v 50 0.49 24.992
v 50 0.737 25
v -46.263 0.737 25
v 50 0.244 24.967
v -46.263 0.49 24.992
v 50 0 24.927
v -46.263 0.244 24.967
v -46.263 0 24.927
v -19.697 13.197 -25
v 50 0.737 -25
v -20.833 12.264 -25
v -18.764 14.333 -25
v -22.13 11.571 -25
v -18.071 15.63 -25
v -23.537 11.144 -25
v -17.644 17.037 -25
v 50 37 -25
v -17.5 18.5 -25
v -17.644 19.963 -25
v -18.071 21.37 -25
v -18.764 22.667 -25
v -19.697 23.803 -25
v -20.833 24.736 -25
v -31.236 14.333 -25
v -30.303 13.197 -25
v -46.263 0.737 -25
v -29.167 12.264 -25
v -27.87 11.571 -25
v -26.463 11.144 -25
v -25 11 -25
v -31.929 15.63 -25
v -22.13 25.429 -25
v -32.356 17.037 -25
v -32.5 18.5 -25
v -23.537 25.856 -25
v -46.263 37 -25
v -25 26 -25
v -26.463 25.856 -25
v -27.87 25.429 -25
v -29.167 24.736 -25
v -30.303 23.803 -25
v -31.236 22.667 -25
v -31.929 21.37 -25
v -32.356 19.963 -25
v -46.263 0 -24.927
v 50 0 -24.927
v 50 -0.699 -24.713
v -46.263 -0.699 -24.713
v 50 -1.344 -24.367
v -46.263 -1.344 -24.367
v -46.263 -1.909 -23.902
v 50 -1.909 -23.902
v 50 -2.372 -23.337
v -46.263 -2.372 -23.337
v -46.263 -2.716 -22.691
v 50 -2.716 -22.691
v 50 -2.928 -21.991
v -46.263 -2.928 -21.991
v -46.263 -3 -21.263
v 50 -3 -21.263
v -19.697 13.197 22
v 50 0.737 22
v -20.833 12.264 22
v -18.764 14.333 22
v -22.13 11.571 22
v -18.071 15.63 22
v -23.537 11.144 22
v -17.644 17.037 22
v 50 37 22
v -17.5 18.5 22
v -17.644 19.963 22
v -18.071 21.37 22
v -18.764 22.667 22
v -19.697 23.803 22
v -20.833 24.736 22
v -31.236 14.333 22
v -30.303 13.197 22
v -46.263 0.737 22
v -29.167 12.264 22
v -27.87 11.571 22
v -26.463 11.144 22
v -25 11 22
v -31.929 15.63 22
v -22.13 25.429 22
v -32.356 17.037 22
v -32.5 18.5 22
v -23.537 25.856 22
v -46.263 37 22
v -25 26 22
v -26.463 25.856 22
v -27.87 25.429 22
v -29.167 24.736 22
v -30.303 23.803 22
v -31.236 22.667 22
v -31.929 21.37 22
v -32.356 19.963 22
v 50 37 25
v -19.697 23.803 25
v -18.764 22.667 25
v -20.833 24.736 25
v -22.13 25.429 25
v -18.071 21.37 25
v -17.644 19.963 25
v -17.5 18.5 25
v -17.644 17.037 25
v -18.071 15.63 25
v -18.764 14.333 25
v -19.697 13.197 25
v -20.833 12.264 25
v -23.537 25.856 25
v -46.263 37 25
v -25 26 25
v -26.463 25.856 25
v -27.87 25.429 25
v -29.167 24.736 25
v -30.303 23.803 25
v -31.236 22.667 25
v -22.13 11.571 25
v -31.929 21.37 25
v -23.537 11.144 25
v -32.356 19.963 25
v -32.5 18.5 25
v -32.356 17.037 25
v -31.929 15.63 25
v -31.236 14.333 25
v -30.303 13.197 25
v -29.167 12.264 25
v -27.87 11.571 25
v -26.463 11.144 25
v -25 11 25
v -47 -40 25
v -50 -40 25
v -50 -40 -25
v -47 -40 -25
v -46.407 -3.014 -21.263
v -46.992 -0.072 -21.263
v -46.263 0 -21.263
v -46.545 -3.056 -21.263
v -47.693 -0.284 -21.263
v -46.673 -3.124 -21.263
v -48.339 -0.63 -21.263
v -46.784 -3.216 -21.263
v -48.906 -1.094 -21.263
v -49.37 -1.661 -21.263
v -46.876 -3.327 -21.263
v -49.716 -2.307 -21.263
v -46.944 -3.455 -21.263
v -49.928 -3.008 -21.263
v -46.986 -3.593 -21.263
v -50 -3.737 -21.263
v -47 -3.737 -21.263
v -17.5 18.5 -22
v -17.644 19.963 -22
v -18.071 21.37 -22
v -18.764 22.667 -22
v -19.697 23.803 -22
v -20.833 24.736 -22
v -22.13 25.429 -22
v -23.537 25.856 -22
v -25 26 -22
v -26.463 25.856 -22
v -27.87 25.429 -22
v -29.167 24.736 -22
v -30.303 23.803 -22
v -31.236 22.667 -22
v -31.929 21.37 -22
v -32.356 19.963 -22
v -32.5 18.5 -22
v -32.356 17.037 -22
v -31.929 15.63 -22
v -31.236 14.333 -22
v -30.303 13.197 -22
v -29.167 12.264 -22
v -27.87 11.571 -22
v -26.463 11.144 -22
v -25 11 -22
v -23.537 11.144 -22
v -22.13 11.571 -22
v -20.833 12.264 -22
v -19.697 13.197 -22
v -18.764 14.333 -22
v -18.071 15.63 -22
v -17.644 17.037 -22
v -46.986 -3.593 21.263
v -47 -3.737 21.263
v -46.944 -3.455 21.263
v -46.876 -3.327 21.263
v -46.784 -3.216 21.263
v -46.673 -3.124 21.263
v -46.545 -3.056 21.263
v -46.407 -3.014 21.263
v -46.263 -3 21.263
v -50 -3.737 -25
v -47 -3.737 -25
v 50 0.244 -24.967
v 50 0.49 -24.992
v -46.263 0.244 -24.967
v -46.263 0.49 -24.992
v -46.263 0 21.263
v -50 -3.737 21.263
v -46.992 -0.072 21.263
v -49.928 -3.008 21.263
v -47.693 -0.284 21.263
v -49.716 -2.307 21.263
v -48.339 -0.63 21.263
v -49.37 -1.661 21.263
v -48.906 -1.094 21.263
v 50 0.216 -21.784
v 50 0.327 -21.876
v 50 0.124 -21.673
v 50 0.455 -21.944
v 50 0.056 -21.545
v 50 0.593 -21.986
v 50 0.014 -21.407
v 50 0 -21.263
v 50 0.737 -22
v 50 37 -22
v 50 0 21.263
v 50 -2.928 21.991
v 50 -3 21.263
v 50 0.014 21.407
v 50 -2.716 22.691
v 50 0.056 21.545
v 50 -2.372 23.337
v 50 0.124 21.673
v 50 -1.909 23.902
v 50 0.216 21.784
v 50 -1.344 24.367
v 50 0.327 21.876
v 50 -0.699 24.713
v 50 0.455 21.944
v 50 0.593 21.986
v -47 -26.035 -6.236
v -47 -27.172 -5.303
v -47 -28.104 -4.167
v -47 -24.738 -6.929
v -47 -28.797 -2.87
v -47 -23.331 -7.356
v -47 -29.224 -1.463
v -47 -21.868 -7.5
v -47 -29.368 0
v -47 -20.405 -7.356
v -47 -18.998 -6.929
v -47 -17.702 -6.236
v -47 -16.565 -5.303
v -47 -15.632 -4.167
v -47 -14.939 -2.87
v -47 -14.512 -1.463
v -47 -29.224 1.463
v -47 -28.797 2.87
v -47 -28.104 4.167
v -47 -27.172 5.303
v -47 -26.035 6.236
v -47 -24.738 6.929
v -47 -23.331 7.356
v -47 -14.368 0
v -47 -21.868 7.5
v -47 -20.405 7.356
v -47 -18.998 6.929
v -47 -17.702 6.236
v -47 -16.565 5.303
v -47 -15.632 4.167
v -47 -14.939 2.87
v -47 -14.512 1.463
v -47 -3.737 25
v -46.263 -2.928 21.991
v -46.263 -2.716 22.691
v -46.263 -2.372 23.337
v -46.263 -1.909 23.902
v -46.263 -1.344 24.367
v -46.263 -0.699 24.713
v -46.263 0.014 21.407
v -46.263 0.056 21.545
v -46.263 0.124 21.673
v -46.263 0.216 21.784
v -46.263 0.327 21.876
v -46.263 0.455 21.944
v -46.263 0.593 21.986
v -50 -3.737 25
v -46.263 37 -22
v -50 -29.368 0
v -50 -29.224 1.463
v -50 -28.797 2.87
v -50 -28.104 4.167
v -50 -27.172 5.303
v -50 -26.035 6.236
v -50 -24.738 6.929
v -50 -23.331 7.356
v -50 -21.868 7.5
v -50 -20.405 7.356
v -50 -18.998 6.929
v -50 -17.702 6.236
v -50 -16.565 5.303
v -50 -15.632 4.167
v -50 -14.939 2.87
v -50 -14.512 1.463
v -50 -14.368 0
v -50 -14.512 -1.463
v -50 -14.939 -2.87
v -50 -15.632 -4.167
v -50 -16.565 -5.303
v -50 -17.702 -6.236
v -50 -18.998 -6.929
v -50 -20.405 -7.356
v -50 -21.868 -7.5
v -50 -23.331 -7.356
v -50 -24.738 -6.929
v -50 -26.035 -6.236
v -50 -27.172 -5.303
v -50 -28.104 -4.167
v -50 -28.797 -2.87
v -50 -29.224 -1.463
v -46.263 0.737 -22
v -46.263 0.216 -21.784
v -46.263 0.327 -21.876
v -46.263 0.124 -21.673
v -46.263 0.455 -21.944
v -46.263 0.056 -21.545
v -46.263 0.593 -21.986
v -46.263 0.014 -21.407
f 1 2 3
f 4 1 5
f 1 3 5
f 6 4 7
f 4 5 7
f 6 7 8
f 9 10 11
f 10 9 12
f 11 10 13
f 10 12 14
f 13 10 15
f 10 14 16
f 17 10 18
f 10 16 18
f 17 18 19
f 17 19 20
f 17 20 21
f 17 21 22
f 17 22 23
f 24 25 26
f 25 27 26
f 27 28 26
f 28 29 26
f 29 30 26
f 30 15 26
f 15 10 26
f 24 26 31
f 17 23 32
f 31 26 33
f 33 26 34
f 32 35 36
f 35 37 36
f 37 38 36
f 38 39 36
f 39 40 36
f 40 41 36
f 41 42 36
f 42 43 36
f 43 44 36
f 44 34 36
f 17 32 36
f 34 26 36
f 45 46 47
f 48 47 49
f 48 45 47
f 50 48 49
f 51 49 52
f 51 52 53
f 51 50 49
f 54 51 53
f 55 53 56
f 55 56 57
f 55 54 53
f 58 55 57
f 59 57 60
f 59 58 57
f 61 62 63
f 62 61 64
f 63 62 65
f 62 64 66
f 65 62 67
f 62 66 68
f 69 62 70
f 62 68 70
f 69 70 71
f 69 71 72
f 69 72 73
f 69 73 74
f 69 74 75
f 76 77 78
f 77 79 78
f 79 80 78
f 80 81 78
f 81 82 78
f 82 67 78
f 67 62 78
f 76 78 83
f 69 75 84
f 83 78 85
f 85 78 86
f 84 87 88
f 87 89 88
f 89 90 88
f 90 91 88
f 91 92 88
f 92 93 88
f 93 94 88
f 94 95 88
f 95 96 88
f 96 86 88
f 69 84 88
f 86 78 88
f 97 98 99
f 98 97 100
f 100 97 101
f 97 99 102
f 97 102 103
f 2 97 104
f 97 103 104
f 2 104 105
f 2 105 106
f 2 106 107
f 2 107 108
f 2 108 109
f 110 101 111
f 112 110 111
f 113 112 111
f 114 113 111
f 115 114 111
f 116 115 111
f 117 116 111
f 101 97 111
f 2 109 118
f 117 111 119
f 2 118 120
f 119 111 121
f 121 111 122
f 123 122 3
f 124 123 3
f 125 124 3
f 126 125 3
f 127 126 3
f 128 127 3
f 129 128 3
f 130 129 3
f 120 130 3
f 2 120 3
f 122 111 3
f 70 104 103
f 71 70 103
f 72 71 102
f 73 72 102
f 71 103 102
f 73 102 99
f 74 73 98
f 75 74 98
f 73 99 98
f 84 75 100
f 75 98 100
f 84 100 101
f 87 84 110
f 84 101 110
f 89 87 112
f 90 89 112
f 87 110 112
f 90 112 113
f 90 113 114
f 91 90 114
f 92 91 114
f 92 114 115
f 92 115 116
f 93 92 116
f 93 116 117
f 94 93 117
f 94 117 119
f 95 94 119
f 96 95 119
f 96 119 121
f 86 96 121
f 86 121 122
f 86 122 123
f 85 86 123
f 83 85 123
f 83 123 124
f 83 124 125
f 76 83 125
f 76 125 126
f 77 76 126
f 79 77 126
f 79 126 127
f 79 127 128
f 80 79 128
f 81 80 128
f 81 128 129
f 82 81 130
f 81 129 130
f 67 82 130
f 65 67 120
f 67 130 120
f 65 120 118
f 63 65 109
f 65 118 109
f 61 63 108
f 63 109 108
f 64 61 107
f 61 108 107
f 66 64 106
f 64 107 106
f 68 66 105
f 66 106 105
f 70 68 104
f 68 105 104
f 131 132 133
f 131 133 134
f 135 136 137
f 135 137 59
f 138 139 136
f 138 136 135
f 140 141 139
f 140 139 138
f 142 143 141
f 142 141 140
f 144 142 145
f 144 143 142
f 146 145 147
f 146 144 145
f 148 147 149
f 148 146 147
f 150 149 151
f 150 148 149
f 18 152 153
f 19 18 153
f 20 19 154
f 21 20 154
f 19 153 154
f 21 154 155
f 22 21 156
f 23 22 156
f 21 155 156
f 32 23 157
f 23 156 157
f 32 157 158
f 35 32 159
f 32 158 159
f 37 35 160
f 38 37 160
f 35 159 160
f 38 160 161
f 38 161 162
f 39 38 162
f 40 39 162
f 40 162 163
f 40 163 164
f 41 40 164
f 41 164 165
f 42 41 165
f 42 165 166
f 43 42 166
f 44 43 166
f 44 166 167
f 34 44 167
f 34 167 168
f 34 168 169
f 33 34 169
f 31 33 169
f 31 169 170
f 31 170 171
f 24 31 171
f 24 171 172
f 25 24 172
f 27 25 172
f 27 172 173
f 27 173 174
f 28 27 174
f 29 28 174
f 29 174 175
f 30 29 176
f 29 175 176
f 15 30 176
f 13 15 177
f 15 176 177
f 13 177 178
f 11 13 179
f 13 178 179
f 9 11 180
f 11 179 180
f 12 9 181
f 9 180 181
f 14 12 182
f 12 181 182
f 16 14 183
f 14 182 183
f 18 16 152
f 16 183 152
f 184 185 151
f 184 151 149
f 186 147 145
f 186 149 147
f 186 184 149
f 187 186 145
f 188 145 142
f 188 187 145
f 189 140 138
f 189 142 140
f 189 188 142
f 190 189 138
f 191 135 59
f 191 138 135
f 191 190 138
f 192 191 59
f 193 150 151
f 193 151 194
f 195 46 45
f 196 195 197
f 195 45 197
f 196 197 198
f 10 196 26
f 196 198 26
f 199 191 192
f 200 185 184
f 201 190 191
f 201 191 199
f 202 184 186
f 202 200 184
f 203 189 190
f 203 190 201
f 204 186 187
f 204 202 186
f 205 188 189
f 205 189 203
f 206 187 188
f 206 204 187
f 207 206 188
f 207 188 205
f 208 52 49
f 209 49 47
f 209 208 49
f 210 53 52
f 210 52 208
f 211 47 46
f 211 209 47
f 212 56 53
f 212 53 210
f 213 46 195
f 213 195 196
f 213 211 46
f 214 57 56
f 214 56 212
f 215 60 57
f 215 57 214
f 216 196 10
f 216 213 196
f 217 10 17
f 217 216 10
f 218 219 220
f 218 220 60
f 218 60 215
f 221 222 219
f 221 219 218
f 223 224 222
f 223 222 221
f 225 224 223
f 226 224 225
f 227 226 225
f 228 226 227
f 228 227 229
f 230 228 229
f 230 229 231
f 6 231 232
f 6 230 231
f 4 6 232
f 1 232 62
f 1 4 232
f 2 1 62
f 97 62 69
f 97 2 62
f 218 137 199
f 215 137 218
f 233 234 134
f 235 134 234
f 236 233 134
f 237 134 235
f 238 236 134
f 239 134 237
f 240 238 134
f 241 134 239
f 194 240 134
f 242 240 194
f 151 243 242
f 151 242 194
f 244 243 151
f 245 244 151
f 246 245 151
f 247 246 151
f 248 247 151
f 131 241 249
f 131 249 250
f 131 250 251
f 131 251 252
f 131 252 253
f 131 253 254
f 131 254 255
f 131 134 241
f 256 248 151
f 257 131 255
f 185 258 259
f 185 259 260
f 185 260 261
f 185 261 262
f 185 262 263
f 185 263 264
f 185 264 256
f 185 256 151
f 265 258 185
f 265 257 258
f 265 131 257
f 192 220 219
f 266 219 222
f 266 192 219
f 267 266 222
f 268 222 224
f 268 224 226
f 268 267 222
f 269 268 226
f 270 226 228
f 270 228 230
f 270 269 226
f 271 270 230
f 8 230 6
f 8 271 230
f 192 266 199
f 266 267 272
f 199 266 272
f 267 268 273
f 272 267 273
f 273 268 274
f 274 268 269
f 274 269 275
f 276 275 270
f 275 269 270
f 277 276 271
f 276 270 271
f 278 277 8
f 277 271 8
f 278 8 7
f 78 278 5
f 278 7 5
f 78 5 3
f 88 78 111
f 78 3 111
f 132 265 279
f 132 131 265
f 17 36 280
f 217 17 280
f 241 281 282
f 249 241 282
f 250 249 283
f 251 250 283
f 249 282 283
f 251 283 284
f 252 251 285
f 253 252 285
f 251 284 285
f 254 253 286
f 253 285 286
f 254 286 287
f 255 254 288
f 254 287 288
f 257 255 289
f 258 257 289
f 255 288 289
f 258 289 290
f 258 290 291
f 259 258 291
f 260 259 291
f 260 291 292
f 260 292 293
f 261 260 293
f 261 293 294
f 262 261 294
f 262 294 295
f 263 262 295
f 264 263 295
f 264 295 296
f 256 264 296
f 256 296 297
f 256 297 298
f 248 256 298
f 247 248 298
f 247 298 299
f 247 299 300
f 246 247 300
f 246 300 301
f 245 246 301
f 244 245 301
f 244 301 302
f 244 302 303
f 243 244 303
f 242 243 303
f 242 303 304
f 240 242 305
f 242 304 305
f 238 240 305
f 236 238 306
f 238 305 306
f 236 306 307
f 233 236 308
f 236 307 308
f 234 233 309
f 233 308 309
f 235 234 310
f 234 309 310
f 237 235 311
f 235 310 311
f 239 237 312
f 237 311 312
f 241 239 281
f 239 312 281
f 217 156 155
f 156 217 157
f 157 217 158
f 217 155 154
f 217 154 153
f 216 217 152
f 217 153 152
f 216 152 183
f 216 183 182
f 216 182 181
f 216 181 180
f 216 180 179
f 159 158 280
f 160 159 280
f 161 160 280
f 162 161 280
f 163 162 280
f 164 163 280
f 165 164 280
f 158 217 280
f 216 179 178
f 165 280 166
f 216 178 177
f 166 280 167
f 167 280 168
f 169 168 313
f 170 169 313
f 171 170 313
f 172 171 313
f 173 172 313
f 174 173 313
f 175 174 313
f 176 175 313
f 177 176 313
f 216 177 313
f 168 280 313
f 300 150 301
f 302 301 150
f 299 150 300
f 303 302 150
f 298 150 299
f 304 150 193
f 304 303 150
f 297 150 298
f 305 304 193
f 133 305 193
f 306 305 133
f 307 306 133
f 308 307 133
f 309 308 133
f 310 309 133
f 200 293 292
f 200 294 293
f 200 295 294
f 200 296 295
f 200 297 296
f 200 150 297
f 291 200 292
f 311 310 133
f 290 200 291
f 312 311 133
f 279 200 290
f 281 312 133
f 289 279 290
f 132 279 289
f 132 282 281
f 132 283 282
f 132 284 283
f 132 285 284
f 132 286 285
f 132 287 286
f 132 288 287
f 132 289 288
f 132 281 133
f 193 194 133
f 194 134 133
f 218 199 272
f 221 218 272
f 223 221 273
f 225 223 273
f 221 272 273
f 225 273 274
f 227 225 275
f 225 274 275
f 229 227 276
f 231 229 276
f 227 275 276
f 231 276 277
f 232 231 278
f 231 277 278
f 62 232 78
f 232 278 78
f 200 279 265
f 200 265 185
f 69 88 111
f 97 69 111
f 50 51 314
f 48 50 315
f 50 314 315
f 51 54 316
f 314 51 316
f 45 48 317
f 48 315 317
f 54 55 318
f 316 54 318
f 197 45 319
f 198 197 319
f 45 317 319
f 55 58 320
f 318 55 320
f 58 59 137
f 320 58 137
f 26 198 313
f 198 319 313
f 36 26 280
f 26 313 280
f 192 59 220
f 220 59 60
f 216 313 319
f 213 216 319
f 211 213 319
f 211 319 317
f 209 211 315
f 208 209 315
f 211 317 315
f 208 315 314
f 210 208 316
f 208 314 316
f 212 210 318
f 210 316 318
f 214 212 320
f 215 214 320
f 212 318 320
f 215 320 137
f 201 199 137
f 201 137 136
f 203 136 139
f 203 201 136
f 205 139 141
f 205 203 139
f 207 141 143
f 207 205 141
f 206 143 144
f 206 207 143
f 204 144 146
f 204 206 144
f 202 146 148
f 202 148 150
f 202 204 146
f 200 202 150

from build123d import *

# Parameters (mm, degrees)
SKETCH1_W                    = 100
SKETCH1_H                    = 50
BASE_FLANGE1_DEPTH           = 3
EDGE_FLANGE1_STRIP_W         = 13.4732
EDGE_FLANGE1_STRIP_H         = 3
EDGE_FLANGE1_STRIP_CUT_DEPTH = 50
EDGE_FLANGE1_DEPTH           = 50
EDGE_FLANGE2_START           = -50
EDGE_FLANGE2_DEPTH           = 100
EDGE_FLANGE2_2_DEPTH         = 3.7366
EDGE_FLANGE2_START_2         = -46.2634
EDGE_FLANGE2_3_DEPTH         = 96.2634
SKETCH15_R                   = 7.5
CUT_EXTRUDE1_DEPTH           = 82.240384046
CUT_EXTRUDE2_REACH           = 112.567
SKETCH16_R                   = 7.5


# Read off the part's stored shape, not the designer's step: Edge-Flange2
# Sheet-metal steps are written as plain solids
with BuildPart() as part:
    # Sketch1 → Base-Flange1 (new body)
    with BuildSketch(Plane(origin=(0, 0, 0), x_dir=(1, 0, 0), z_dir=(0, 1, 0))):
        Rectangle(SKETCH1_W, SKETCH1_H)
    extrude(amount=-BASE_FLANGE1_DEPTH)

    # Edge-Flange1 strip (across the edge) → Edge-Flange1 strip cut (cut)
    with BuildSketch(Plane(origin=(-50, -3, 25), x_dir=(1, 0, 0), z_dir=(0, 0, -1))):
        with Locations((-3, -1.5)):
            Rectangle(EDGE_FLANGE1_STRIP_W, EDGE_FLANGE1_STRIP_H)
    extrude(amount=EDGE_FLANGE1_STRIP_CUT_DEPTH, mode=Mode.SUBTRACT)

    # Edge-Flange1 section (across the edge) → Edge-Flange1 (add)
    with BuildSketch(Plane(origin=(-50, -3, 25), x_dir=(1, 0, 0), z_dir=(0, 0, -1))):
        with BuildLine():
            Line((0, 0.7366), (0, 37))
            Line((0, 37), (3, 37))
            Line((3, 37), (3, 0.7366))
            ThreePointArc((3, 0.7366), (3.215745145, 0.215745145), (3.7366, 0))
            Line((3.7366, 0), (3.7366, -3))
            ThreePointArc((3.7366, -3), (1.094424801, -1.905575199), (0, 0.7366))
        make_face()
    extrude(amount=EDGE_FLANGE1_DEPTH)

    # Edge-Flange2 outline → Edge-Flange2 (cut)
    with BuildSketch(Plane.YZ.offset(EDGE_FLANGE2_START)):
        with BuildLine():
            Line((-3, -21.2634), (-3.7366, -21.2634))
            Line((-3.7366, -21.2634), (-3.7366, -25))
            Line((-3.7366, -25), (0, -25))
            Line((0, -25), (0, -24.926677222))
            ThreePointArc((0, -24.926677222), (-2.154295979, -23.630867001), (-3, -21.2634))
        make_face()
        with BuildLine():
            Line((0, 25), (-3.7366, 25))
            Line((-3.7366, 25), (-3.7366, 21.2634))
            Line((-3.7366, 21.2634), (-3, 21.2634))
            ThreePointArc((-3, 21.2634), (-2.154295979, 23.630867001), (0, 24.926677222))
            Line((0, 24.926677222), (0, 25))
        make_face()
    extrude(amount=EDGE_FLANGE2_DEPTH, mode=Mode.SUBTRACT)

    # Edge-Flange2 2 outline → Edge-Flange2 2 (cut)
    with BuildSketch(Plane.YZ.offset(EDGE_FLANGE2_START)):
        with BuildLine():
            Line((0, -21.2634), (-3, -21.2634))
            ThreePointArc((-3, -21.2634), (-2.154295979, -23.630867001), (0, -24.926677222))
            Line((0, -24.926677222), (0, -21.2634))
        make_face()
        with BuildLine():
            ThreePointArc((0, 24.926677222), (-2.154295979, 23.630867001), (-3, 21.2634))
            Line((-3, 21.2634), (0, 21.2634))
            Line((0, 21.2634), (0, 24.926677222))
        make_face()
    extrude(amount=EDGE_FLANGE2_2_DEPTH, mode=Mode.SUBTRACT)

    # Edge-Flange2 3 outline → Edge-Flange2 3 (add)
    with BuildSketch(Plane.YZ.offset(EDGE_FLANGE2_START_2)):
        with BuildLine():
            ThreePointArc((0.7366, -22), (0.215745145, -21.784254855), (0, -21.2634))
            Line((0, -21.2634), (0, -24.926677222))
            ThreePointArc((0, -24.926677222), (0.36647982, -24.981624121), (0.7366, -25))
            Line((0.7366, -25), (37, -25))
            Line((37, -25), (37, -22))
            Line((37, -22), (0.7366, -22))
        make_face()
        with BuildLine():
            Line((0, 24.926677222), (0, 21.2634))
            ThreePointArc((0, 21.2634), (0.215745145, 21.784254855), (0.7366, 22))
            Line((0.7366, 22), (37, 22))
            Line((37, 22), (37, 25))
            Line((37, 25), (0.7366, 25))
            ThreePointArc((0.7366, 25), (0.36647982, 24.981624121), (0, 24.926677222))
        make_face()
    extrude(amount=EDGE_FLANGE2_3_DEPTH)

    # Sketch15 → Cut-Extrude1 (cut, through all)
    with BuildSketch(Plane.XY.offset(25)):
        with Locations((-25, 18.5)):
            Circle(SKETCH15_R)
    extrude(amount=-CUT_EXTRUDE1_DEPTH, mode=Mode.SUBTRACT)

    # Sketch16 → Cut-Extrude2 (cut, up to next)
    with BuildSketch(Plane.ZY.offset(50), mode=Mode.PRIVATE) as cut_extrude2_sk1:
        with Locations(Location((0, -21.8683, 0), (0, 0, 270))):
            Circle(SKETCH16_R)
    cut_extrude2_tool1 = extrude(cut_extrude2_sk1.sketch, amount=-CUT_EXTRUDE2_REACH, mode=Mode.PRIVATE) & part.part
    add(cut_extrude2_tool1.solids().sort_by_distance((-50, -21.8683, 0))[0], mode=Mode.SUBTRACT)


solid = part.part
